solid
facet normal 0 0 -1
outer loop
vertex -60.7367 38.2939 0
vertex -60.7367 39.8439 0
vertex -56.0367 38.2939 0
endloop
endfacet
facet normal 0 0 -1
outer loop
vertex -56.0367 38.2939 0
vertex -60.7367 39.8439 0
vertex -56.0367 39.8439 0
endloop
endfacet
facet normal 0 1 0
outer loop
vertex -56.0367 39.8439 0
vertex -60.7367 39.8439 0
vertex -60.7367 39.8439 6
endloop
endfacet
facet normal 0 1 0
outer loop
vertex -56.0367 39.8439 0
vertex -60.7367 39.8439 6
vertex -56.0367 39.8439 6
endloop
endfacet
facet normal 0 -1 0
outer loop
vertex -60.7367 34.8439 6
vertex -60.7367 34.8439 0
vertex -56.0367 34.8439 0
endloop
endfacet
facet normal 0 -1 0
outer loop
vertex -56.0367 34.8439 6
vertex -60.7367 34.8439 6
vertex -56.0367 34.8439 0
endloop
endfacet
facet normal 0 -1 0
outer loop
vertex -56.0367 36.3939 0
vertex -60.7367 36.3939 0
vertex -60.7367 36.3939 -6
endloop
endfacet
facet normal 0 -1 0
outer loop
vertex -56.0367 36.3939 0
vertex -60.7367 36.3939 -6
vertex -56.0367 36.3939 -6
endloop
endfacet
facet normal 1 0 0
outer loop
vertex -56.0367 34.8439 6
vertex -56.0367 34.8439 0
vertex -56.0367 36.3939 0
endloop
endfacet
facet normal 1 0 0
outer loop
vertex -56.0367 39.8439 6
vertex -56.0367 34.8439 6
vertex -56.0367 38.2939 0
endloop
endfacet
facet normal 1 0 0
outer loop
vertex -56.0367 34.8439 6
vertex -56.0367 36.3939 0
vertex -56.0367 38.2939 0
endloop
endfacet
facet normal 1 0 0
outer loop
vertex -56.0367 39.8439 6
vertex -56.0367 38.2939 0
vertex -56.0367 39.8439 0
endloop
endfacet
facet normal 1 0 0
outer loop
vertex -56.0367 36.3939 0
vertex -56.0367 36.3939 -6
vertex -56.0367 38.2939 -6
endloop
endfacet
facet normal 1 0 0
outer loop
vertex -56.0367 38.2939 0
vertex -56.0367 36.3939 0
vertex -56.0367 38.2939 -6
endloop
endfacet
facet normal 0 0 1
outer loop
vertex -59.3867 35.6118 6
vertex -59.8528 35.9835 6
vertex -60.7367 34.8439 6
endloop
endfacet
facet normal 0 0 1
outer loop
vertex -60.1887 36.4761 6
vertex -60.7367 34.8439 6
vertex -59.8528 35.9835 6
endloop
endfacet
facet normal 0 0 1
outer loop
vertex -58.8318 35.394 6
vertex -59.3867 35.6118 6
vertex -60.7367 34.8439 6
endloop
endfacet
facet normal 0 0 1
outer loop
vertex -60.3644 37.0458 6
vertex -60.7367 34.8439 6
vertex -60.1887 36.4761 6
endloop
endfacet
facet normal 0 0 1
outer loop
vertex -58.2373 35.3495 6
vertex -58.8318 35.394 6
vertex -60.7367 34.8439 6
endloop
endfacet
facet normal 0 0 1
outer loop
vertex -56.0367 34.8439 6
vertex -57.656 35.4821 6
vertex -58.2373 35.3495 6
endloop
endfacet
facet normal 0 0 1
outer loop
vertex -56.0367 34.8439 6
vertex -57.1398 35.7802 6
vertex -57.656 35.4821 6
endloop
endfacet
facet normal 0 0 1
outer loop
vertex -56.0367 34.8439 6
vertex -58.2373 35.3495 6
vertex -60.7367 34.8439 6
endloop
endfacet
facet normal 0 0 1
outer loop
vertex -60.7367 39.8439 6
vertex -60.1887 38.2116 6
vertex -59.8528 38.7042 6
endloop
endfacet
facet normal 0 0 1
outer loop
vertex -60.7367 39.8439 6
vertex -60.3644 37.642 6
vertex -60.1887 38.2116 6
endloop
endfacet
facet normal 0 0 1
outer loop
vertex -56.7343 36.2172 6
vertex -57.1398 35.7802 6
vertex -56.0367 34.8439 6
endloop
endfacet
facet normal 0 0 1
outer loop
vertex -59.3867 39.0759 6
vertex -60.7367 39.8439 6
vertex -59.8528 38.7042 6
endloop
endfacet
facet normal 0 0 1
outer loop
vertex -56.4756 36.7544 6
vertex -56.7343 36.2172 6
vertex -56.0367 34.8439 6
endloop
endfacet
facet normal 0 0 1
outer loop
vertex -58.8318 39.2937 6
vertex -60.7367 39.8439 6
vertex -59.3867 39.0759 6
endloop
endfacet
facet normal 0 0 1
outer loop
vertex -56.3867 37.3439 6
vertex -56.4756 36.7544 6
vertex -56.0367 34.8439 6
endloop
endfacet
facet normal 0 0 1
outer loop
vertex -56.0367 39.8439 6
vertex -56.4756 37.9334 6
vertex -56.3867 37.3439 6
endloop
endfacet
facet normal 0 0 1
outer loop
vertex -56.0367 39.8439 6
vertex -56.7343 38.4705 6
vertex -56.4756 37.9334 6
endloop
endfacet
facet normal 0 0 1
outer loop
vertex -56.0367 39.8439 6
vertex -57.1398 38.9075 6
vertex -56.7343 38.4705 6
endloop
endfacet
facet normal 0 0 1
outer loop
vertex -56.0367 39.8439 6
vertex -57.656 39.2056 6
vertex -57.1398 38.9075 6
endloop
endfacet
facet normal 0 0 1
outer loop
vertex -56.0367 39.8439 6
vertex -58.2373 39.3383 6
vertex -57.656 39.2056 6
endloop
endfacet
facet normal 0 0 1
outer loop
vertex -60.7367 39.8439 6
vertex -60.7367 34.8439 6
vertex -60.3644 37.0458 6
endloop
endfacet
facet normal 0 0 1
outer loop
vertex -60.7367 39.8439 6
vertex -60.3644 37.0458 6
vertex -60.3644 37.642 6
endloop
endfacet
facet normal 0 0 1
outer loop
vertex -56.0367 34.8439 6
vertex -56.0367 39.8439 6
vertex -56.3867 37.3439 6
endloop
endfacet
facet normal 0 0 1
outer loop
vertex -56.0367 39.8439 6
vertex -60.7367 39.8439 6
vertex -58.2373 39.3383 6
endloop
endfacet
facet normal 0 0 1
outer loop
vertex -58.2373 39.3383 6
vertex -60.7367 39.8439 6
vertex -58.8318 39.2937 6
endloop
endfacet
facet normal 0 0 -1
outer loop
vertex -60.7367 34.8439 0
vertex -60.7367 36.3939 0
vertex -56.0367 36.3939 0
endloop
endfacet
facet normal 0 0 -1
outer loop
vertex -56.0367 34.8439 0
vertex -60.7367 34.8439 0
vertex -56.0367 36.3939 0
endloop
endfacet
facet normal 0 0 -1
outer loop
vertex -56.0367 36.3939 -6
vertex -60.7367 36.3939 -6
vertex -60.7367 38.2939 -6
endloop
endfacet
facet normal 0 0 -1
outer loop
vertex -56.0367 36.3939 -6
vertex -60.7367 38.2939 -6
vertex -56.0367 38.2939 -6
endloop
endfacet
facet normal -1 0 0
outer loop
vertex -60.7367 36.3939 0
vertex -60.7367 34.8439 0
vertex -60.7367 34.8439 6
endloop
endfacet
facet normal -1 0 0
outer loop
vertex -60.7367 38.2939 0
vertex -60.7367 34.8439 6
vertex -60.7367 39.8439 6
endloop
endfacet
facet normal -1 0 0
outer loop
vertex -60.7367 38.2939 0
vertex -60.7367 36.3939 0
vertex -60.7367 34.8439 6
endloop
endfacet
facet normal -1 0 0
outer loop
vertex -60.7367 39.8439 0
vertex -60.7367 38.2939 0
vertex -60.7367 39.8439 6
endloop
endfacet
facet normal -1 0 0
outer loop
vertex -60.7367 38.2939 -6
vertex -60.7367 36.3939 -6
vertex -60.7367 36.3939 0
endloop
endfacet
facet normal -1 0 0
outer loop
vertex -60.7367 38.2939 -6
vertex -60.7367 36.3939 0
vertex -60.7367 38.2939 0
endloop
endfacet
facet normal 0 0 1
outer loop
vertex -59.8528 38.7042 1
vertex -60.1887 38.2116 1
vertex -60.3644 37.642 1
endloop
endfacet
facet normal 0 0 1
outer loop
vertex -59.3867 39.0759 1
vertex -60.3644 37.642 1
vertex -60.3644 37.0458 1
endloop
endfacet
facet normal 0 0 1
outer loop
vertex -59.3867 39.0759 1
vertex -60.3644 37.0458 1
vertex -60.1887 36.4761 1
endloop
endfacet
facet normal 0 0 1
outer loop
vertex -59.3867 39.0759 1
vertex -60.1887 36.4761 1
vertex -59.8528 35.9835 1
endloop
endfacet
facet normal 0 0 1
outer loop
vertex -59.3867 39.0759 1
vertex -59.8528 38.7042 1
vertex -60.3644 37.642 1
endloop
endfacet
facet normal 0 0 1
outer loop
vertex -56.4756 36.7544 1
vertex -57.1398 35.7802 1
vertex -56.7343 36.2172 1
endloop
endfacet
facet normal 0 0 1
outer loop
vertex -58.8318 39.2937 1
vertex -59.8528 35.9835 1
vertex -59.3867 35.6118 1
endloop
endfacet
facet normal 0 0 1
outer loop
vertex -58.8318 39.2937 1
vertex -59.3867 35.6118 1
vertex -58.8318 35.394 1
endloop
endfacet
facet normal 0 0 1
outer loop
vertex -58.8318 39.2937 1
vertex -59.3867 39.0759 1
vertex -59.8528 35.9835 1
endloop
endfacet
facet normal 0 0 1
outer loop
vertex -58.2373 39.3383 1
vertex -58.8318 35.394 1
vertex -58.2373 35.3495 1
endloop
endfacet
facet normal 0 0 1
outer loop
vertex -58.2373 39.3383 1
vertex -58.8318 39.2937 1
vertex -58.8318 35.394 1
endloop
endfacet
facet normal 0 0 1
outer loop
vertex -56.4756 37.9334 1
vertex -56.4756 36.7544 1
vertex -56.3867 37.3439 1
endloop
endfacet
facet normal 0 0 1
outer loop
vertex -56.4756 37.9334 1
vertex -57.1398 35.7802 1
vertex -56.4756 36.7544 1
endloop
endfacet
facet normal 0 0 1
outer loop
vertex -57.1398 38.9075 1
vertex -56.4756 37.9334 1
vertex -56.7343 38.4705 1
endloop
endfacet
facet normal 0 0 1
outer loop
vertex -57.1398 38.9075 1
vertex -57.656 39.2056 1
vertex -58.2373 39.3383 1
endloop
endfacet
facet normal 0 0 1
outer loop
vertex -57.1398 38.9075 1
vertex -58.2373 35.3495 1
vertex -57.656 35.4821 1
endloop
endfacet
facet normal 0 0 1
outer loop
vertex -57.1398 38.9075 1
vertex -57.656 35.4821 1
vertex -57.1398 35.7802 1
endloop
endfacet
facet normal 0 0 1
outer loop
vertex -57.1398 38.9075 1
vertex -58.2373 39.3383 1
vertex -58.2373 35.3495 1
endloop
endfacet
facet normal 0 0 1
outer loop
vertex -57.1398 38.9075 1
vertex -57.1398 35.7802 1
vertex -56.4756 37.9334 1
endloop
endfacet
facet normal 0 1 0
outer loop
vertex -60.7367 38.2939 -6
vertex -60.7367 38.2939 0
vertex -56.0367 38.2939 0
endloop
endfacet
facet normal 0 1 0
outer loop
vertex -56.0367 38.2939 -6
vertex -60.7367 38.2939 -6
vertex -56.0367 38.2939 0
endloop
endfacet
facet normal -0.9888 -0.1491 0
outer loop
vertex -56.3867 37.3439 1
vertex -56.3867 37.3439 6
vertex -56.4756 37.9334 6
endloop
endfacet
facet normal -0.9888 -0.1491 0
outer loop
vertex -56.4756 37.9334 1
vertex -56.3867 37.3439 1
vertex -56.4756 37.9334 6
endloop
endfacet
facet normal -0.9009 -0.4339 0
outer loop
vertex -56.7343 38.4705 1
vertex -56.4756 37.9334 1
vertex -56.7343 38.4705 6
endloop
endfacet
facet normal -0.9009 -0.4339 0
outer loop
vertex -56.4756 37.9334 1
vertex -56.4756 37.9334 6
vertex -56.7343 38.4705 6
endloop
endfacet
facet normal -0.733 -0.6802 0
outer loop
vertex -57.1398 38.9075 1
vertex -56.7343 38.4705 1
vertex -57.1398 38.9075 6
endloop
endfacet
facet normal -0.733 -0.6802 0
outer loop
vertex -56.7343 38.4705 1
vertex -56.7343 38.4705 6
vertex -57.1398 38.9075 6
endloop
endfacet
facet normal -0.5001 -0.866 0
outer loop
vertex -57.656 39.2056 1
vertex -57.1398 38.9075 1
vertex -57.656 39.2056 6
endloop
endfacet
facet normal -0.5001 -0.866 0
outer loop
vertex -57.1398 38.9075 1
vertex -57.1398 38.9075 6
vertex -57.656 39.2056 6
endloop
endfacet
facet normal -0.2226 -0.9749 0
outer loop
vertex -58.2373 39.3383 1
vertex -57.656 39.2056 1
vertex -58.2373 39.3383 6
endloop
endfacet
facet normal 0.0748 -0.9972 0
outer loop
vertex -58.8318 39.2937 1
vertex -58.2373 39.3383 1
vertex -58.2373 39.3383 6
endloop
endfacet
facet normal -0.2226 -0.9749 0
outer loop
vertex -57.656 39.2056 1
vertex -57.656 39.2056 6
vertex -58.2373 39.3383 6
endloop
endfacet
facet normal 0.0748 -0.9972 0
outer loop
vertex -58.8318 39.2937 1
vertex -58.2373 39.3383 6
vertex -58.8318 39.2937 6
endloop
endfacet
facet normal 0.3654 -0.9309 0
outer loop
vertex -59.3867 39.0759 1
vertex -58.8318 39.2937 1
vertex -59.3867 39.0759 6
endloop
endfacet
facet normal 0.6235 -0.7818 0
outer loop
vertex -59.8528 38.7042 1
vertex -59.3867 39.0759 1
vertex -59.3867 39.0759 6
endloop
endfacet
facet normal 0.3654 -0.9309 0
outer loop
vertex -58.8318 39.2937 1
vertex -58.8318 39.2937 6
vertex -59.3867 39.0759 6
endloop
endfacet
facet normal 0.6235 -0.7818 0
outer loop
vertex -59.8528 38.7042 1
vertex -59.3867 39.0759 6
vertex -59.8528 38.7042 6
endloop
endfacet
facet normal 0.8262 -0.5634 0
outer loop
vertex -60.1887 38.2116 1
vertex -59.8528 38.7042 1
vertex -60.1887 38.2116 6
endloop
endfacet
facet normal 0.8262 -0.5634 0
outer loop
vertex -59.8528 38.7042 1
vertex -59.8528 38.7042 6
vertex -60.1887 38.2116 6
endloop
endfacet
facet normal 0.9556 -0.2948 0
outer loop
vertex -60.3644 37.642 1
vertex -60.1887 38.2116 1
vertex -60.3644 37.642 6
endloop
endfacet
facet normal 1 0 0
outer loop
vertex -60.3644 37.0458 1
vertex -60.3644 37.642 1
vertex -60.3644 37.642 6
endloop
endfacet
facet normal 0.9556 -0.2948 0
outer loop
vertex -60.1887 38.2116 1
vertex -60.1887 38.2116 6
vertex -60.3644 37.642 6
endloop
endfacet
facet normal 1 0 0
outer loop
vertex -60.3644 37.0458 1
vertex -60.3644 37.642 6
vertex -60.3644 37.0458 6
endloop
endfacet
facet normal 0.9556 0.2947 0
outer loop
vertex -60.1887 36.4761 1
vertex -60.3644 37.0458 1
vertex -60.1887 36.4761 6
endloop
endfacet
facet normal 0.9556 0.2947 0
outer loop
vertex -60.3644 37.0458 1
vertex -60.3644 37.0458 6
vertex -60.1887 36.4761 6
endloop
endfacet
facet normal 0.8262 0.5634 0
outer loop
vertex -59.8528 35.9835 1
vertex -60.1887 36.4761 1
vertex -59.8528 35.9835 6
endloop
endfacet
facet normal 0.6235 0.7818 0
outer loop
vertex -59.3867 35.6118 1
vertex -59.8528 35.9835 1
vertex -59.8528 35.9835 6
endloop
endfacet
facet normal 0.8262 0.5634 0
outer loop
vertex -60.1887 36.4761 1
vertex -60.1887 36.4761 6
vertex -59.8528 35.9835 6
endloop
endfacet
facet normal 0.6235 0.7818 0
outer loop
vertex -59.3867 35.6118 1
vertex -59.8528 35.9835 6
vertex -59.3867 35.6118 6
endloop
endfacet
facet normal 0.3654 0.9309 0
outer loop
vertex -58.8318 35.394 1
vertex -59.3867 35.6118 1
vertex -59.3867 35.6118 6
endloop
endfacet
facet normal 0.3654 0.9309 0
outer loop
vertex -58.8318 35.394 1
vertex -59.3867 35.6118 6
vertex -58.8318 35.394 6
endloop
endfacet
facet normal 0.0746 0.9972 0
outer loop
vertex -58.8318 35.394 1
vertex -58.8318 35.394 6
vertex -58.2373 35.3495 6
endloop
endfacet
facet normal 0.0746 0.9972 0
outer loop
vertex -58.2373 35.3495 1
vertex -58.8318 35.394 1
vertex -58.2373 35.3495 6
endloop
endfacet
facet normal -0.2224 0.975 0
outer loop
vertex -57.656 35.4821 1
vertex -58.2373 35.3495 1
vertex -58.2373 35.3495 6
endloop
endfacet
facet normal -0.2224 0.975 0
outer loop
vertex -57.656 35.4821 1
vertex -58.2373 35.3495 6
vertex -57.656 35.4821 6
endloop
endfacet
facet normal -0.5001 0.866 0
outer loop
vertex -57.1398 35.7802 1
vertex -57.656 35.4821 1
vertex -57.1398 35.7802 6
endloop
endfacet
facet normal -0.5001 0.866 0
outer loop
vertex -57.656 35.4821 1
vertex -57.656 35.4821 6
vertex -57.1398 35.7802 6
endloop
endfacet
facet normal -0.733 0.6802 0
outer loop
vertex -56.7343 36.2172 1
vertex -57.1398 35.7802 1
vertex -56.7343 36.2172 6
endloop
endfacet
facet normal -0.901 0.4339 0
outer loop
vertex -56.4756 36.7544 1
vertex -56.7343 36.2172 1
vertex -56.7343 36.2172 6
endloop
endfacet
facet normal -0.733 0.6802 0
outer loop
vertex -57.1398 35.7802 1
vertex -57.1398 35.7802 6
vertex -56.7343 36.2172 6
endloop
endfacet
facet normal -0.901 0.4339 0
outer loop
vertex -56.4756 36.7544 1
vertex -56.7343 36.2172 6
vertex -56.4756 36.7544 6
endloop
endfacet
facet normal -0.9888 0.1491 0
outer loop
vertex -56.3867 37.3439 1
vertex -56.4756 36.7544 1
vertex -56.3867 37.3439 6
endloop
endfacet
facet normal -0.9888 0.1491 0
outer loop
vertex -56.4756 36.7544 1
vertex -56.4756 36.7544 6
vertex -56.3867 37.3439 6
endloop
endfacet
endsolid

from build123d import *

# Parameters (mm, degrees)
F0_W     = 4.7
F0_H     = 5
F1_DEPTH = 6
F2_R     = 2
F3_DEPTH = 5
F4_W     = 4.7
F4_H     = 1.9
F5_DEPTH = 6


with BuildPart() as f1:
    # F0 (on Top) → F1 (new body)
    with BuildSketch(Plane.XY):
        with Locations((-58.38673, 37.343877)):
            Rectangle(F0_W, F0_H)
    extrude(amount=F1_DEPTH)

    # F2 (on face) → F3 (cut)
    with BuildSketch(Plane.XY.offset(6)):
        with Locations((-58.38673, 37.343877)):
            Circle(F2_R)
    extrude(amount=-F3_DEPTH, mode=Mode.SUBTRACT)

    # F4 (on face) → F5 (join)
    with BuildSketch(Plane(origin=(0, 0, 0), x_dir=(1, 0, 0), z_dir=(0, 0, -1))):
        with Locations((-58.38673, -37.343877)):
            Rectangle(F4_W, F4_H)
    extrude(amount=F5_DEPTH)


solid = f1.part
